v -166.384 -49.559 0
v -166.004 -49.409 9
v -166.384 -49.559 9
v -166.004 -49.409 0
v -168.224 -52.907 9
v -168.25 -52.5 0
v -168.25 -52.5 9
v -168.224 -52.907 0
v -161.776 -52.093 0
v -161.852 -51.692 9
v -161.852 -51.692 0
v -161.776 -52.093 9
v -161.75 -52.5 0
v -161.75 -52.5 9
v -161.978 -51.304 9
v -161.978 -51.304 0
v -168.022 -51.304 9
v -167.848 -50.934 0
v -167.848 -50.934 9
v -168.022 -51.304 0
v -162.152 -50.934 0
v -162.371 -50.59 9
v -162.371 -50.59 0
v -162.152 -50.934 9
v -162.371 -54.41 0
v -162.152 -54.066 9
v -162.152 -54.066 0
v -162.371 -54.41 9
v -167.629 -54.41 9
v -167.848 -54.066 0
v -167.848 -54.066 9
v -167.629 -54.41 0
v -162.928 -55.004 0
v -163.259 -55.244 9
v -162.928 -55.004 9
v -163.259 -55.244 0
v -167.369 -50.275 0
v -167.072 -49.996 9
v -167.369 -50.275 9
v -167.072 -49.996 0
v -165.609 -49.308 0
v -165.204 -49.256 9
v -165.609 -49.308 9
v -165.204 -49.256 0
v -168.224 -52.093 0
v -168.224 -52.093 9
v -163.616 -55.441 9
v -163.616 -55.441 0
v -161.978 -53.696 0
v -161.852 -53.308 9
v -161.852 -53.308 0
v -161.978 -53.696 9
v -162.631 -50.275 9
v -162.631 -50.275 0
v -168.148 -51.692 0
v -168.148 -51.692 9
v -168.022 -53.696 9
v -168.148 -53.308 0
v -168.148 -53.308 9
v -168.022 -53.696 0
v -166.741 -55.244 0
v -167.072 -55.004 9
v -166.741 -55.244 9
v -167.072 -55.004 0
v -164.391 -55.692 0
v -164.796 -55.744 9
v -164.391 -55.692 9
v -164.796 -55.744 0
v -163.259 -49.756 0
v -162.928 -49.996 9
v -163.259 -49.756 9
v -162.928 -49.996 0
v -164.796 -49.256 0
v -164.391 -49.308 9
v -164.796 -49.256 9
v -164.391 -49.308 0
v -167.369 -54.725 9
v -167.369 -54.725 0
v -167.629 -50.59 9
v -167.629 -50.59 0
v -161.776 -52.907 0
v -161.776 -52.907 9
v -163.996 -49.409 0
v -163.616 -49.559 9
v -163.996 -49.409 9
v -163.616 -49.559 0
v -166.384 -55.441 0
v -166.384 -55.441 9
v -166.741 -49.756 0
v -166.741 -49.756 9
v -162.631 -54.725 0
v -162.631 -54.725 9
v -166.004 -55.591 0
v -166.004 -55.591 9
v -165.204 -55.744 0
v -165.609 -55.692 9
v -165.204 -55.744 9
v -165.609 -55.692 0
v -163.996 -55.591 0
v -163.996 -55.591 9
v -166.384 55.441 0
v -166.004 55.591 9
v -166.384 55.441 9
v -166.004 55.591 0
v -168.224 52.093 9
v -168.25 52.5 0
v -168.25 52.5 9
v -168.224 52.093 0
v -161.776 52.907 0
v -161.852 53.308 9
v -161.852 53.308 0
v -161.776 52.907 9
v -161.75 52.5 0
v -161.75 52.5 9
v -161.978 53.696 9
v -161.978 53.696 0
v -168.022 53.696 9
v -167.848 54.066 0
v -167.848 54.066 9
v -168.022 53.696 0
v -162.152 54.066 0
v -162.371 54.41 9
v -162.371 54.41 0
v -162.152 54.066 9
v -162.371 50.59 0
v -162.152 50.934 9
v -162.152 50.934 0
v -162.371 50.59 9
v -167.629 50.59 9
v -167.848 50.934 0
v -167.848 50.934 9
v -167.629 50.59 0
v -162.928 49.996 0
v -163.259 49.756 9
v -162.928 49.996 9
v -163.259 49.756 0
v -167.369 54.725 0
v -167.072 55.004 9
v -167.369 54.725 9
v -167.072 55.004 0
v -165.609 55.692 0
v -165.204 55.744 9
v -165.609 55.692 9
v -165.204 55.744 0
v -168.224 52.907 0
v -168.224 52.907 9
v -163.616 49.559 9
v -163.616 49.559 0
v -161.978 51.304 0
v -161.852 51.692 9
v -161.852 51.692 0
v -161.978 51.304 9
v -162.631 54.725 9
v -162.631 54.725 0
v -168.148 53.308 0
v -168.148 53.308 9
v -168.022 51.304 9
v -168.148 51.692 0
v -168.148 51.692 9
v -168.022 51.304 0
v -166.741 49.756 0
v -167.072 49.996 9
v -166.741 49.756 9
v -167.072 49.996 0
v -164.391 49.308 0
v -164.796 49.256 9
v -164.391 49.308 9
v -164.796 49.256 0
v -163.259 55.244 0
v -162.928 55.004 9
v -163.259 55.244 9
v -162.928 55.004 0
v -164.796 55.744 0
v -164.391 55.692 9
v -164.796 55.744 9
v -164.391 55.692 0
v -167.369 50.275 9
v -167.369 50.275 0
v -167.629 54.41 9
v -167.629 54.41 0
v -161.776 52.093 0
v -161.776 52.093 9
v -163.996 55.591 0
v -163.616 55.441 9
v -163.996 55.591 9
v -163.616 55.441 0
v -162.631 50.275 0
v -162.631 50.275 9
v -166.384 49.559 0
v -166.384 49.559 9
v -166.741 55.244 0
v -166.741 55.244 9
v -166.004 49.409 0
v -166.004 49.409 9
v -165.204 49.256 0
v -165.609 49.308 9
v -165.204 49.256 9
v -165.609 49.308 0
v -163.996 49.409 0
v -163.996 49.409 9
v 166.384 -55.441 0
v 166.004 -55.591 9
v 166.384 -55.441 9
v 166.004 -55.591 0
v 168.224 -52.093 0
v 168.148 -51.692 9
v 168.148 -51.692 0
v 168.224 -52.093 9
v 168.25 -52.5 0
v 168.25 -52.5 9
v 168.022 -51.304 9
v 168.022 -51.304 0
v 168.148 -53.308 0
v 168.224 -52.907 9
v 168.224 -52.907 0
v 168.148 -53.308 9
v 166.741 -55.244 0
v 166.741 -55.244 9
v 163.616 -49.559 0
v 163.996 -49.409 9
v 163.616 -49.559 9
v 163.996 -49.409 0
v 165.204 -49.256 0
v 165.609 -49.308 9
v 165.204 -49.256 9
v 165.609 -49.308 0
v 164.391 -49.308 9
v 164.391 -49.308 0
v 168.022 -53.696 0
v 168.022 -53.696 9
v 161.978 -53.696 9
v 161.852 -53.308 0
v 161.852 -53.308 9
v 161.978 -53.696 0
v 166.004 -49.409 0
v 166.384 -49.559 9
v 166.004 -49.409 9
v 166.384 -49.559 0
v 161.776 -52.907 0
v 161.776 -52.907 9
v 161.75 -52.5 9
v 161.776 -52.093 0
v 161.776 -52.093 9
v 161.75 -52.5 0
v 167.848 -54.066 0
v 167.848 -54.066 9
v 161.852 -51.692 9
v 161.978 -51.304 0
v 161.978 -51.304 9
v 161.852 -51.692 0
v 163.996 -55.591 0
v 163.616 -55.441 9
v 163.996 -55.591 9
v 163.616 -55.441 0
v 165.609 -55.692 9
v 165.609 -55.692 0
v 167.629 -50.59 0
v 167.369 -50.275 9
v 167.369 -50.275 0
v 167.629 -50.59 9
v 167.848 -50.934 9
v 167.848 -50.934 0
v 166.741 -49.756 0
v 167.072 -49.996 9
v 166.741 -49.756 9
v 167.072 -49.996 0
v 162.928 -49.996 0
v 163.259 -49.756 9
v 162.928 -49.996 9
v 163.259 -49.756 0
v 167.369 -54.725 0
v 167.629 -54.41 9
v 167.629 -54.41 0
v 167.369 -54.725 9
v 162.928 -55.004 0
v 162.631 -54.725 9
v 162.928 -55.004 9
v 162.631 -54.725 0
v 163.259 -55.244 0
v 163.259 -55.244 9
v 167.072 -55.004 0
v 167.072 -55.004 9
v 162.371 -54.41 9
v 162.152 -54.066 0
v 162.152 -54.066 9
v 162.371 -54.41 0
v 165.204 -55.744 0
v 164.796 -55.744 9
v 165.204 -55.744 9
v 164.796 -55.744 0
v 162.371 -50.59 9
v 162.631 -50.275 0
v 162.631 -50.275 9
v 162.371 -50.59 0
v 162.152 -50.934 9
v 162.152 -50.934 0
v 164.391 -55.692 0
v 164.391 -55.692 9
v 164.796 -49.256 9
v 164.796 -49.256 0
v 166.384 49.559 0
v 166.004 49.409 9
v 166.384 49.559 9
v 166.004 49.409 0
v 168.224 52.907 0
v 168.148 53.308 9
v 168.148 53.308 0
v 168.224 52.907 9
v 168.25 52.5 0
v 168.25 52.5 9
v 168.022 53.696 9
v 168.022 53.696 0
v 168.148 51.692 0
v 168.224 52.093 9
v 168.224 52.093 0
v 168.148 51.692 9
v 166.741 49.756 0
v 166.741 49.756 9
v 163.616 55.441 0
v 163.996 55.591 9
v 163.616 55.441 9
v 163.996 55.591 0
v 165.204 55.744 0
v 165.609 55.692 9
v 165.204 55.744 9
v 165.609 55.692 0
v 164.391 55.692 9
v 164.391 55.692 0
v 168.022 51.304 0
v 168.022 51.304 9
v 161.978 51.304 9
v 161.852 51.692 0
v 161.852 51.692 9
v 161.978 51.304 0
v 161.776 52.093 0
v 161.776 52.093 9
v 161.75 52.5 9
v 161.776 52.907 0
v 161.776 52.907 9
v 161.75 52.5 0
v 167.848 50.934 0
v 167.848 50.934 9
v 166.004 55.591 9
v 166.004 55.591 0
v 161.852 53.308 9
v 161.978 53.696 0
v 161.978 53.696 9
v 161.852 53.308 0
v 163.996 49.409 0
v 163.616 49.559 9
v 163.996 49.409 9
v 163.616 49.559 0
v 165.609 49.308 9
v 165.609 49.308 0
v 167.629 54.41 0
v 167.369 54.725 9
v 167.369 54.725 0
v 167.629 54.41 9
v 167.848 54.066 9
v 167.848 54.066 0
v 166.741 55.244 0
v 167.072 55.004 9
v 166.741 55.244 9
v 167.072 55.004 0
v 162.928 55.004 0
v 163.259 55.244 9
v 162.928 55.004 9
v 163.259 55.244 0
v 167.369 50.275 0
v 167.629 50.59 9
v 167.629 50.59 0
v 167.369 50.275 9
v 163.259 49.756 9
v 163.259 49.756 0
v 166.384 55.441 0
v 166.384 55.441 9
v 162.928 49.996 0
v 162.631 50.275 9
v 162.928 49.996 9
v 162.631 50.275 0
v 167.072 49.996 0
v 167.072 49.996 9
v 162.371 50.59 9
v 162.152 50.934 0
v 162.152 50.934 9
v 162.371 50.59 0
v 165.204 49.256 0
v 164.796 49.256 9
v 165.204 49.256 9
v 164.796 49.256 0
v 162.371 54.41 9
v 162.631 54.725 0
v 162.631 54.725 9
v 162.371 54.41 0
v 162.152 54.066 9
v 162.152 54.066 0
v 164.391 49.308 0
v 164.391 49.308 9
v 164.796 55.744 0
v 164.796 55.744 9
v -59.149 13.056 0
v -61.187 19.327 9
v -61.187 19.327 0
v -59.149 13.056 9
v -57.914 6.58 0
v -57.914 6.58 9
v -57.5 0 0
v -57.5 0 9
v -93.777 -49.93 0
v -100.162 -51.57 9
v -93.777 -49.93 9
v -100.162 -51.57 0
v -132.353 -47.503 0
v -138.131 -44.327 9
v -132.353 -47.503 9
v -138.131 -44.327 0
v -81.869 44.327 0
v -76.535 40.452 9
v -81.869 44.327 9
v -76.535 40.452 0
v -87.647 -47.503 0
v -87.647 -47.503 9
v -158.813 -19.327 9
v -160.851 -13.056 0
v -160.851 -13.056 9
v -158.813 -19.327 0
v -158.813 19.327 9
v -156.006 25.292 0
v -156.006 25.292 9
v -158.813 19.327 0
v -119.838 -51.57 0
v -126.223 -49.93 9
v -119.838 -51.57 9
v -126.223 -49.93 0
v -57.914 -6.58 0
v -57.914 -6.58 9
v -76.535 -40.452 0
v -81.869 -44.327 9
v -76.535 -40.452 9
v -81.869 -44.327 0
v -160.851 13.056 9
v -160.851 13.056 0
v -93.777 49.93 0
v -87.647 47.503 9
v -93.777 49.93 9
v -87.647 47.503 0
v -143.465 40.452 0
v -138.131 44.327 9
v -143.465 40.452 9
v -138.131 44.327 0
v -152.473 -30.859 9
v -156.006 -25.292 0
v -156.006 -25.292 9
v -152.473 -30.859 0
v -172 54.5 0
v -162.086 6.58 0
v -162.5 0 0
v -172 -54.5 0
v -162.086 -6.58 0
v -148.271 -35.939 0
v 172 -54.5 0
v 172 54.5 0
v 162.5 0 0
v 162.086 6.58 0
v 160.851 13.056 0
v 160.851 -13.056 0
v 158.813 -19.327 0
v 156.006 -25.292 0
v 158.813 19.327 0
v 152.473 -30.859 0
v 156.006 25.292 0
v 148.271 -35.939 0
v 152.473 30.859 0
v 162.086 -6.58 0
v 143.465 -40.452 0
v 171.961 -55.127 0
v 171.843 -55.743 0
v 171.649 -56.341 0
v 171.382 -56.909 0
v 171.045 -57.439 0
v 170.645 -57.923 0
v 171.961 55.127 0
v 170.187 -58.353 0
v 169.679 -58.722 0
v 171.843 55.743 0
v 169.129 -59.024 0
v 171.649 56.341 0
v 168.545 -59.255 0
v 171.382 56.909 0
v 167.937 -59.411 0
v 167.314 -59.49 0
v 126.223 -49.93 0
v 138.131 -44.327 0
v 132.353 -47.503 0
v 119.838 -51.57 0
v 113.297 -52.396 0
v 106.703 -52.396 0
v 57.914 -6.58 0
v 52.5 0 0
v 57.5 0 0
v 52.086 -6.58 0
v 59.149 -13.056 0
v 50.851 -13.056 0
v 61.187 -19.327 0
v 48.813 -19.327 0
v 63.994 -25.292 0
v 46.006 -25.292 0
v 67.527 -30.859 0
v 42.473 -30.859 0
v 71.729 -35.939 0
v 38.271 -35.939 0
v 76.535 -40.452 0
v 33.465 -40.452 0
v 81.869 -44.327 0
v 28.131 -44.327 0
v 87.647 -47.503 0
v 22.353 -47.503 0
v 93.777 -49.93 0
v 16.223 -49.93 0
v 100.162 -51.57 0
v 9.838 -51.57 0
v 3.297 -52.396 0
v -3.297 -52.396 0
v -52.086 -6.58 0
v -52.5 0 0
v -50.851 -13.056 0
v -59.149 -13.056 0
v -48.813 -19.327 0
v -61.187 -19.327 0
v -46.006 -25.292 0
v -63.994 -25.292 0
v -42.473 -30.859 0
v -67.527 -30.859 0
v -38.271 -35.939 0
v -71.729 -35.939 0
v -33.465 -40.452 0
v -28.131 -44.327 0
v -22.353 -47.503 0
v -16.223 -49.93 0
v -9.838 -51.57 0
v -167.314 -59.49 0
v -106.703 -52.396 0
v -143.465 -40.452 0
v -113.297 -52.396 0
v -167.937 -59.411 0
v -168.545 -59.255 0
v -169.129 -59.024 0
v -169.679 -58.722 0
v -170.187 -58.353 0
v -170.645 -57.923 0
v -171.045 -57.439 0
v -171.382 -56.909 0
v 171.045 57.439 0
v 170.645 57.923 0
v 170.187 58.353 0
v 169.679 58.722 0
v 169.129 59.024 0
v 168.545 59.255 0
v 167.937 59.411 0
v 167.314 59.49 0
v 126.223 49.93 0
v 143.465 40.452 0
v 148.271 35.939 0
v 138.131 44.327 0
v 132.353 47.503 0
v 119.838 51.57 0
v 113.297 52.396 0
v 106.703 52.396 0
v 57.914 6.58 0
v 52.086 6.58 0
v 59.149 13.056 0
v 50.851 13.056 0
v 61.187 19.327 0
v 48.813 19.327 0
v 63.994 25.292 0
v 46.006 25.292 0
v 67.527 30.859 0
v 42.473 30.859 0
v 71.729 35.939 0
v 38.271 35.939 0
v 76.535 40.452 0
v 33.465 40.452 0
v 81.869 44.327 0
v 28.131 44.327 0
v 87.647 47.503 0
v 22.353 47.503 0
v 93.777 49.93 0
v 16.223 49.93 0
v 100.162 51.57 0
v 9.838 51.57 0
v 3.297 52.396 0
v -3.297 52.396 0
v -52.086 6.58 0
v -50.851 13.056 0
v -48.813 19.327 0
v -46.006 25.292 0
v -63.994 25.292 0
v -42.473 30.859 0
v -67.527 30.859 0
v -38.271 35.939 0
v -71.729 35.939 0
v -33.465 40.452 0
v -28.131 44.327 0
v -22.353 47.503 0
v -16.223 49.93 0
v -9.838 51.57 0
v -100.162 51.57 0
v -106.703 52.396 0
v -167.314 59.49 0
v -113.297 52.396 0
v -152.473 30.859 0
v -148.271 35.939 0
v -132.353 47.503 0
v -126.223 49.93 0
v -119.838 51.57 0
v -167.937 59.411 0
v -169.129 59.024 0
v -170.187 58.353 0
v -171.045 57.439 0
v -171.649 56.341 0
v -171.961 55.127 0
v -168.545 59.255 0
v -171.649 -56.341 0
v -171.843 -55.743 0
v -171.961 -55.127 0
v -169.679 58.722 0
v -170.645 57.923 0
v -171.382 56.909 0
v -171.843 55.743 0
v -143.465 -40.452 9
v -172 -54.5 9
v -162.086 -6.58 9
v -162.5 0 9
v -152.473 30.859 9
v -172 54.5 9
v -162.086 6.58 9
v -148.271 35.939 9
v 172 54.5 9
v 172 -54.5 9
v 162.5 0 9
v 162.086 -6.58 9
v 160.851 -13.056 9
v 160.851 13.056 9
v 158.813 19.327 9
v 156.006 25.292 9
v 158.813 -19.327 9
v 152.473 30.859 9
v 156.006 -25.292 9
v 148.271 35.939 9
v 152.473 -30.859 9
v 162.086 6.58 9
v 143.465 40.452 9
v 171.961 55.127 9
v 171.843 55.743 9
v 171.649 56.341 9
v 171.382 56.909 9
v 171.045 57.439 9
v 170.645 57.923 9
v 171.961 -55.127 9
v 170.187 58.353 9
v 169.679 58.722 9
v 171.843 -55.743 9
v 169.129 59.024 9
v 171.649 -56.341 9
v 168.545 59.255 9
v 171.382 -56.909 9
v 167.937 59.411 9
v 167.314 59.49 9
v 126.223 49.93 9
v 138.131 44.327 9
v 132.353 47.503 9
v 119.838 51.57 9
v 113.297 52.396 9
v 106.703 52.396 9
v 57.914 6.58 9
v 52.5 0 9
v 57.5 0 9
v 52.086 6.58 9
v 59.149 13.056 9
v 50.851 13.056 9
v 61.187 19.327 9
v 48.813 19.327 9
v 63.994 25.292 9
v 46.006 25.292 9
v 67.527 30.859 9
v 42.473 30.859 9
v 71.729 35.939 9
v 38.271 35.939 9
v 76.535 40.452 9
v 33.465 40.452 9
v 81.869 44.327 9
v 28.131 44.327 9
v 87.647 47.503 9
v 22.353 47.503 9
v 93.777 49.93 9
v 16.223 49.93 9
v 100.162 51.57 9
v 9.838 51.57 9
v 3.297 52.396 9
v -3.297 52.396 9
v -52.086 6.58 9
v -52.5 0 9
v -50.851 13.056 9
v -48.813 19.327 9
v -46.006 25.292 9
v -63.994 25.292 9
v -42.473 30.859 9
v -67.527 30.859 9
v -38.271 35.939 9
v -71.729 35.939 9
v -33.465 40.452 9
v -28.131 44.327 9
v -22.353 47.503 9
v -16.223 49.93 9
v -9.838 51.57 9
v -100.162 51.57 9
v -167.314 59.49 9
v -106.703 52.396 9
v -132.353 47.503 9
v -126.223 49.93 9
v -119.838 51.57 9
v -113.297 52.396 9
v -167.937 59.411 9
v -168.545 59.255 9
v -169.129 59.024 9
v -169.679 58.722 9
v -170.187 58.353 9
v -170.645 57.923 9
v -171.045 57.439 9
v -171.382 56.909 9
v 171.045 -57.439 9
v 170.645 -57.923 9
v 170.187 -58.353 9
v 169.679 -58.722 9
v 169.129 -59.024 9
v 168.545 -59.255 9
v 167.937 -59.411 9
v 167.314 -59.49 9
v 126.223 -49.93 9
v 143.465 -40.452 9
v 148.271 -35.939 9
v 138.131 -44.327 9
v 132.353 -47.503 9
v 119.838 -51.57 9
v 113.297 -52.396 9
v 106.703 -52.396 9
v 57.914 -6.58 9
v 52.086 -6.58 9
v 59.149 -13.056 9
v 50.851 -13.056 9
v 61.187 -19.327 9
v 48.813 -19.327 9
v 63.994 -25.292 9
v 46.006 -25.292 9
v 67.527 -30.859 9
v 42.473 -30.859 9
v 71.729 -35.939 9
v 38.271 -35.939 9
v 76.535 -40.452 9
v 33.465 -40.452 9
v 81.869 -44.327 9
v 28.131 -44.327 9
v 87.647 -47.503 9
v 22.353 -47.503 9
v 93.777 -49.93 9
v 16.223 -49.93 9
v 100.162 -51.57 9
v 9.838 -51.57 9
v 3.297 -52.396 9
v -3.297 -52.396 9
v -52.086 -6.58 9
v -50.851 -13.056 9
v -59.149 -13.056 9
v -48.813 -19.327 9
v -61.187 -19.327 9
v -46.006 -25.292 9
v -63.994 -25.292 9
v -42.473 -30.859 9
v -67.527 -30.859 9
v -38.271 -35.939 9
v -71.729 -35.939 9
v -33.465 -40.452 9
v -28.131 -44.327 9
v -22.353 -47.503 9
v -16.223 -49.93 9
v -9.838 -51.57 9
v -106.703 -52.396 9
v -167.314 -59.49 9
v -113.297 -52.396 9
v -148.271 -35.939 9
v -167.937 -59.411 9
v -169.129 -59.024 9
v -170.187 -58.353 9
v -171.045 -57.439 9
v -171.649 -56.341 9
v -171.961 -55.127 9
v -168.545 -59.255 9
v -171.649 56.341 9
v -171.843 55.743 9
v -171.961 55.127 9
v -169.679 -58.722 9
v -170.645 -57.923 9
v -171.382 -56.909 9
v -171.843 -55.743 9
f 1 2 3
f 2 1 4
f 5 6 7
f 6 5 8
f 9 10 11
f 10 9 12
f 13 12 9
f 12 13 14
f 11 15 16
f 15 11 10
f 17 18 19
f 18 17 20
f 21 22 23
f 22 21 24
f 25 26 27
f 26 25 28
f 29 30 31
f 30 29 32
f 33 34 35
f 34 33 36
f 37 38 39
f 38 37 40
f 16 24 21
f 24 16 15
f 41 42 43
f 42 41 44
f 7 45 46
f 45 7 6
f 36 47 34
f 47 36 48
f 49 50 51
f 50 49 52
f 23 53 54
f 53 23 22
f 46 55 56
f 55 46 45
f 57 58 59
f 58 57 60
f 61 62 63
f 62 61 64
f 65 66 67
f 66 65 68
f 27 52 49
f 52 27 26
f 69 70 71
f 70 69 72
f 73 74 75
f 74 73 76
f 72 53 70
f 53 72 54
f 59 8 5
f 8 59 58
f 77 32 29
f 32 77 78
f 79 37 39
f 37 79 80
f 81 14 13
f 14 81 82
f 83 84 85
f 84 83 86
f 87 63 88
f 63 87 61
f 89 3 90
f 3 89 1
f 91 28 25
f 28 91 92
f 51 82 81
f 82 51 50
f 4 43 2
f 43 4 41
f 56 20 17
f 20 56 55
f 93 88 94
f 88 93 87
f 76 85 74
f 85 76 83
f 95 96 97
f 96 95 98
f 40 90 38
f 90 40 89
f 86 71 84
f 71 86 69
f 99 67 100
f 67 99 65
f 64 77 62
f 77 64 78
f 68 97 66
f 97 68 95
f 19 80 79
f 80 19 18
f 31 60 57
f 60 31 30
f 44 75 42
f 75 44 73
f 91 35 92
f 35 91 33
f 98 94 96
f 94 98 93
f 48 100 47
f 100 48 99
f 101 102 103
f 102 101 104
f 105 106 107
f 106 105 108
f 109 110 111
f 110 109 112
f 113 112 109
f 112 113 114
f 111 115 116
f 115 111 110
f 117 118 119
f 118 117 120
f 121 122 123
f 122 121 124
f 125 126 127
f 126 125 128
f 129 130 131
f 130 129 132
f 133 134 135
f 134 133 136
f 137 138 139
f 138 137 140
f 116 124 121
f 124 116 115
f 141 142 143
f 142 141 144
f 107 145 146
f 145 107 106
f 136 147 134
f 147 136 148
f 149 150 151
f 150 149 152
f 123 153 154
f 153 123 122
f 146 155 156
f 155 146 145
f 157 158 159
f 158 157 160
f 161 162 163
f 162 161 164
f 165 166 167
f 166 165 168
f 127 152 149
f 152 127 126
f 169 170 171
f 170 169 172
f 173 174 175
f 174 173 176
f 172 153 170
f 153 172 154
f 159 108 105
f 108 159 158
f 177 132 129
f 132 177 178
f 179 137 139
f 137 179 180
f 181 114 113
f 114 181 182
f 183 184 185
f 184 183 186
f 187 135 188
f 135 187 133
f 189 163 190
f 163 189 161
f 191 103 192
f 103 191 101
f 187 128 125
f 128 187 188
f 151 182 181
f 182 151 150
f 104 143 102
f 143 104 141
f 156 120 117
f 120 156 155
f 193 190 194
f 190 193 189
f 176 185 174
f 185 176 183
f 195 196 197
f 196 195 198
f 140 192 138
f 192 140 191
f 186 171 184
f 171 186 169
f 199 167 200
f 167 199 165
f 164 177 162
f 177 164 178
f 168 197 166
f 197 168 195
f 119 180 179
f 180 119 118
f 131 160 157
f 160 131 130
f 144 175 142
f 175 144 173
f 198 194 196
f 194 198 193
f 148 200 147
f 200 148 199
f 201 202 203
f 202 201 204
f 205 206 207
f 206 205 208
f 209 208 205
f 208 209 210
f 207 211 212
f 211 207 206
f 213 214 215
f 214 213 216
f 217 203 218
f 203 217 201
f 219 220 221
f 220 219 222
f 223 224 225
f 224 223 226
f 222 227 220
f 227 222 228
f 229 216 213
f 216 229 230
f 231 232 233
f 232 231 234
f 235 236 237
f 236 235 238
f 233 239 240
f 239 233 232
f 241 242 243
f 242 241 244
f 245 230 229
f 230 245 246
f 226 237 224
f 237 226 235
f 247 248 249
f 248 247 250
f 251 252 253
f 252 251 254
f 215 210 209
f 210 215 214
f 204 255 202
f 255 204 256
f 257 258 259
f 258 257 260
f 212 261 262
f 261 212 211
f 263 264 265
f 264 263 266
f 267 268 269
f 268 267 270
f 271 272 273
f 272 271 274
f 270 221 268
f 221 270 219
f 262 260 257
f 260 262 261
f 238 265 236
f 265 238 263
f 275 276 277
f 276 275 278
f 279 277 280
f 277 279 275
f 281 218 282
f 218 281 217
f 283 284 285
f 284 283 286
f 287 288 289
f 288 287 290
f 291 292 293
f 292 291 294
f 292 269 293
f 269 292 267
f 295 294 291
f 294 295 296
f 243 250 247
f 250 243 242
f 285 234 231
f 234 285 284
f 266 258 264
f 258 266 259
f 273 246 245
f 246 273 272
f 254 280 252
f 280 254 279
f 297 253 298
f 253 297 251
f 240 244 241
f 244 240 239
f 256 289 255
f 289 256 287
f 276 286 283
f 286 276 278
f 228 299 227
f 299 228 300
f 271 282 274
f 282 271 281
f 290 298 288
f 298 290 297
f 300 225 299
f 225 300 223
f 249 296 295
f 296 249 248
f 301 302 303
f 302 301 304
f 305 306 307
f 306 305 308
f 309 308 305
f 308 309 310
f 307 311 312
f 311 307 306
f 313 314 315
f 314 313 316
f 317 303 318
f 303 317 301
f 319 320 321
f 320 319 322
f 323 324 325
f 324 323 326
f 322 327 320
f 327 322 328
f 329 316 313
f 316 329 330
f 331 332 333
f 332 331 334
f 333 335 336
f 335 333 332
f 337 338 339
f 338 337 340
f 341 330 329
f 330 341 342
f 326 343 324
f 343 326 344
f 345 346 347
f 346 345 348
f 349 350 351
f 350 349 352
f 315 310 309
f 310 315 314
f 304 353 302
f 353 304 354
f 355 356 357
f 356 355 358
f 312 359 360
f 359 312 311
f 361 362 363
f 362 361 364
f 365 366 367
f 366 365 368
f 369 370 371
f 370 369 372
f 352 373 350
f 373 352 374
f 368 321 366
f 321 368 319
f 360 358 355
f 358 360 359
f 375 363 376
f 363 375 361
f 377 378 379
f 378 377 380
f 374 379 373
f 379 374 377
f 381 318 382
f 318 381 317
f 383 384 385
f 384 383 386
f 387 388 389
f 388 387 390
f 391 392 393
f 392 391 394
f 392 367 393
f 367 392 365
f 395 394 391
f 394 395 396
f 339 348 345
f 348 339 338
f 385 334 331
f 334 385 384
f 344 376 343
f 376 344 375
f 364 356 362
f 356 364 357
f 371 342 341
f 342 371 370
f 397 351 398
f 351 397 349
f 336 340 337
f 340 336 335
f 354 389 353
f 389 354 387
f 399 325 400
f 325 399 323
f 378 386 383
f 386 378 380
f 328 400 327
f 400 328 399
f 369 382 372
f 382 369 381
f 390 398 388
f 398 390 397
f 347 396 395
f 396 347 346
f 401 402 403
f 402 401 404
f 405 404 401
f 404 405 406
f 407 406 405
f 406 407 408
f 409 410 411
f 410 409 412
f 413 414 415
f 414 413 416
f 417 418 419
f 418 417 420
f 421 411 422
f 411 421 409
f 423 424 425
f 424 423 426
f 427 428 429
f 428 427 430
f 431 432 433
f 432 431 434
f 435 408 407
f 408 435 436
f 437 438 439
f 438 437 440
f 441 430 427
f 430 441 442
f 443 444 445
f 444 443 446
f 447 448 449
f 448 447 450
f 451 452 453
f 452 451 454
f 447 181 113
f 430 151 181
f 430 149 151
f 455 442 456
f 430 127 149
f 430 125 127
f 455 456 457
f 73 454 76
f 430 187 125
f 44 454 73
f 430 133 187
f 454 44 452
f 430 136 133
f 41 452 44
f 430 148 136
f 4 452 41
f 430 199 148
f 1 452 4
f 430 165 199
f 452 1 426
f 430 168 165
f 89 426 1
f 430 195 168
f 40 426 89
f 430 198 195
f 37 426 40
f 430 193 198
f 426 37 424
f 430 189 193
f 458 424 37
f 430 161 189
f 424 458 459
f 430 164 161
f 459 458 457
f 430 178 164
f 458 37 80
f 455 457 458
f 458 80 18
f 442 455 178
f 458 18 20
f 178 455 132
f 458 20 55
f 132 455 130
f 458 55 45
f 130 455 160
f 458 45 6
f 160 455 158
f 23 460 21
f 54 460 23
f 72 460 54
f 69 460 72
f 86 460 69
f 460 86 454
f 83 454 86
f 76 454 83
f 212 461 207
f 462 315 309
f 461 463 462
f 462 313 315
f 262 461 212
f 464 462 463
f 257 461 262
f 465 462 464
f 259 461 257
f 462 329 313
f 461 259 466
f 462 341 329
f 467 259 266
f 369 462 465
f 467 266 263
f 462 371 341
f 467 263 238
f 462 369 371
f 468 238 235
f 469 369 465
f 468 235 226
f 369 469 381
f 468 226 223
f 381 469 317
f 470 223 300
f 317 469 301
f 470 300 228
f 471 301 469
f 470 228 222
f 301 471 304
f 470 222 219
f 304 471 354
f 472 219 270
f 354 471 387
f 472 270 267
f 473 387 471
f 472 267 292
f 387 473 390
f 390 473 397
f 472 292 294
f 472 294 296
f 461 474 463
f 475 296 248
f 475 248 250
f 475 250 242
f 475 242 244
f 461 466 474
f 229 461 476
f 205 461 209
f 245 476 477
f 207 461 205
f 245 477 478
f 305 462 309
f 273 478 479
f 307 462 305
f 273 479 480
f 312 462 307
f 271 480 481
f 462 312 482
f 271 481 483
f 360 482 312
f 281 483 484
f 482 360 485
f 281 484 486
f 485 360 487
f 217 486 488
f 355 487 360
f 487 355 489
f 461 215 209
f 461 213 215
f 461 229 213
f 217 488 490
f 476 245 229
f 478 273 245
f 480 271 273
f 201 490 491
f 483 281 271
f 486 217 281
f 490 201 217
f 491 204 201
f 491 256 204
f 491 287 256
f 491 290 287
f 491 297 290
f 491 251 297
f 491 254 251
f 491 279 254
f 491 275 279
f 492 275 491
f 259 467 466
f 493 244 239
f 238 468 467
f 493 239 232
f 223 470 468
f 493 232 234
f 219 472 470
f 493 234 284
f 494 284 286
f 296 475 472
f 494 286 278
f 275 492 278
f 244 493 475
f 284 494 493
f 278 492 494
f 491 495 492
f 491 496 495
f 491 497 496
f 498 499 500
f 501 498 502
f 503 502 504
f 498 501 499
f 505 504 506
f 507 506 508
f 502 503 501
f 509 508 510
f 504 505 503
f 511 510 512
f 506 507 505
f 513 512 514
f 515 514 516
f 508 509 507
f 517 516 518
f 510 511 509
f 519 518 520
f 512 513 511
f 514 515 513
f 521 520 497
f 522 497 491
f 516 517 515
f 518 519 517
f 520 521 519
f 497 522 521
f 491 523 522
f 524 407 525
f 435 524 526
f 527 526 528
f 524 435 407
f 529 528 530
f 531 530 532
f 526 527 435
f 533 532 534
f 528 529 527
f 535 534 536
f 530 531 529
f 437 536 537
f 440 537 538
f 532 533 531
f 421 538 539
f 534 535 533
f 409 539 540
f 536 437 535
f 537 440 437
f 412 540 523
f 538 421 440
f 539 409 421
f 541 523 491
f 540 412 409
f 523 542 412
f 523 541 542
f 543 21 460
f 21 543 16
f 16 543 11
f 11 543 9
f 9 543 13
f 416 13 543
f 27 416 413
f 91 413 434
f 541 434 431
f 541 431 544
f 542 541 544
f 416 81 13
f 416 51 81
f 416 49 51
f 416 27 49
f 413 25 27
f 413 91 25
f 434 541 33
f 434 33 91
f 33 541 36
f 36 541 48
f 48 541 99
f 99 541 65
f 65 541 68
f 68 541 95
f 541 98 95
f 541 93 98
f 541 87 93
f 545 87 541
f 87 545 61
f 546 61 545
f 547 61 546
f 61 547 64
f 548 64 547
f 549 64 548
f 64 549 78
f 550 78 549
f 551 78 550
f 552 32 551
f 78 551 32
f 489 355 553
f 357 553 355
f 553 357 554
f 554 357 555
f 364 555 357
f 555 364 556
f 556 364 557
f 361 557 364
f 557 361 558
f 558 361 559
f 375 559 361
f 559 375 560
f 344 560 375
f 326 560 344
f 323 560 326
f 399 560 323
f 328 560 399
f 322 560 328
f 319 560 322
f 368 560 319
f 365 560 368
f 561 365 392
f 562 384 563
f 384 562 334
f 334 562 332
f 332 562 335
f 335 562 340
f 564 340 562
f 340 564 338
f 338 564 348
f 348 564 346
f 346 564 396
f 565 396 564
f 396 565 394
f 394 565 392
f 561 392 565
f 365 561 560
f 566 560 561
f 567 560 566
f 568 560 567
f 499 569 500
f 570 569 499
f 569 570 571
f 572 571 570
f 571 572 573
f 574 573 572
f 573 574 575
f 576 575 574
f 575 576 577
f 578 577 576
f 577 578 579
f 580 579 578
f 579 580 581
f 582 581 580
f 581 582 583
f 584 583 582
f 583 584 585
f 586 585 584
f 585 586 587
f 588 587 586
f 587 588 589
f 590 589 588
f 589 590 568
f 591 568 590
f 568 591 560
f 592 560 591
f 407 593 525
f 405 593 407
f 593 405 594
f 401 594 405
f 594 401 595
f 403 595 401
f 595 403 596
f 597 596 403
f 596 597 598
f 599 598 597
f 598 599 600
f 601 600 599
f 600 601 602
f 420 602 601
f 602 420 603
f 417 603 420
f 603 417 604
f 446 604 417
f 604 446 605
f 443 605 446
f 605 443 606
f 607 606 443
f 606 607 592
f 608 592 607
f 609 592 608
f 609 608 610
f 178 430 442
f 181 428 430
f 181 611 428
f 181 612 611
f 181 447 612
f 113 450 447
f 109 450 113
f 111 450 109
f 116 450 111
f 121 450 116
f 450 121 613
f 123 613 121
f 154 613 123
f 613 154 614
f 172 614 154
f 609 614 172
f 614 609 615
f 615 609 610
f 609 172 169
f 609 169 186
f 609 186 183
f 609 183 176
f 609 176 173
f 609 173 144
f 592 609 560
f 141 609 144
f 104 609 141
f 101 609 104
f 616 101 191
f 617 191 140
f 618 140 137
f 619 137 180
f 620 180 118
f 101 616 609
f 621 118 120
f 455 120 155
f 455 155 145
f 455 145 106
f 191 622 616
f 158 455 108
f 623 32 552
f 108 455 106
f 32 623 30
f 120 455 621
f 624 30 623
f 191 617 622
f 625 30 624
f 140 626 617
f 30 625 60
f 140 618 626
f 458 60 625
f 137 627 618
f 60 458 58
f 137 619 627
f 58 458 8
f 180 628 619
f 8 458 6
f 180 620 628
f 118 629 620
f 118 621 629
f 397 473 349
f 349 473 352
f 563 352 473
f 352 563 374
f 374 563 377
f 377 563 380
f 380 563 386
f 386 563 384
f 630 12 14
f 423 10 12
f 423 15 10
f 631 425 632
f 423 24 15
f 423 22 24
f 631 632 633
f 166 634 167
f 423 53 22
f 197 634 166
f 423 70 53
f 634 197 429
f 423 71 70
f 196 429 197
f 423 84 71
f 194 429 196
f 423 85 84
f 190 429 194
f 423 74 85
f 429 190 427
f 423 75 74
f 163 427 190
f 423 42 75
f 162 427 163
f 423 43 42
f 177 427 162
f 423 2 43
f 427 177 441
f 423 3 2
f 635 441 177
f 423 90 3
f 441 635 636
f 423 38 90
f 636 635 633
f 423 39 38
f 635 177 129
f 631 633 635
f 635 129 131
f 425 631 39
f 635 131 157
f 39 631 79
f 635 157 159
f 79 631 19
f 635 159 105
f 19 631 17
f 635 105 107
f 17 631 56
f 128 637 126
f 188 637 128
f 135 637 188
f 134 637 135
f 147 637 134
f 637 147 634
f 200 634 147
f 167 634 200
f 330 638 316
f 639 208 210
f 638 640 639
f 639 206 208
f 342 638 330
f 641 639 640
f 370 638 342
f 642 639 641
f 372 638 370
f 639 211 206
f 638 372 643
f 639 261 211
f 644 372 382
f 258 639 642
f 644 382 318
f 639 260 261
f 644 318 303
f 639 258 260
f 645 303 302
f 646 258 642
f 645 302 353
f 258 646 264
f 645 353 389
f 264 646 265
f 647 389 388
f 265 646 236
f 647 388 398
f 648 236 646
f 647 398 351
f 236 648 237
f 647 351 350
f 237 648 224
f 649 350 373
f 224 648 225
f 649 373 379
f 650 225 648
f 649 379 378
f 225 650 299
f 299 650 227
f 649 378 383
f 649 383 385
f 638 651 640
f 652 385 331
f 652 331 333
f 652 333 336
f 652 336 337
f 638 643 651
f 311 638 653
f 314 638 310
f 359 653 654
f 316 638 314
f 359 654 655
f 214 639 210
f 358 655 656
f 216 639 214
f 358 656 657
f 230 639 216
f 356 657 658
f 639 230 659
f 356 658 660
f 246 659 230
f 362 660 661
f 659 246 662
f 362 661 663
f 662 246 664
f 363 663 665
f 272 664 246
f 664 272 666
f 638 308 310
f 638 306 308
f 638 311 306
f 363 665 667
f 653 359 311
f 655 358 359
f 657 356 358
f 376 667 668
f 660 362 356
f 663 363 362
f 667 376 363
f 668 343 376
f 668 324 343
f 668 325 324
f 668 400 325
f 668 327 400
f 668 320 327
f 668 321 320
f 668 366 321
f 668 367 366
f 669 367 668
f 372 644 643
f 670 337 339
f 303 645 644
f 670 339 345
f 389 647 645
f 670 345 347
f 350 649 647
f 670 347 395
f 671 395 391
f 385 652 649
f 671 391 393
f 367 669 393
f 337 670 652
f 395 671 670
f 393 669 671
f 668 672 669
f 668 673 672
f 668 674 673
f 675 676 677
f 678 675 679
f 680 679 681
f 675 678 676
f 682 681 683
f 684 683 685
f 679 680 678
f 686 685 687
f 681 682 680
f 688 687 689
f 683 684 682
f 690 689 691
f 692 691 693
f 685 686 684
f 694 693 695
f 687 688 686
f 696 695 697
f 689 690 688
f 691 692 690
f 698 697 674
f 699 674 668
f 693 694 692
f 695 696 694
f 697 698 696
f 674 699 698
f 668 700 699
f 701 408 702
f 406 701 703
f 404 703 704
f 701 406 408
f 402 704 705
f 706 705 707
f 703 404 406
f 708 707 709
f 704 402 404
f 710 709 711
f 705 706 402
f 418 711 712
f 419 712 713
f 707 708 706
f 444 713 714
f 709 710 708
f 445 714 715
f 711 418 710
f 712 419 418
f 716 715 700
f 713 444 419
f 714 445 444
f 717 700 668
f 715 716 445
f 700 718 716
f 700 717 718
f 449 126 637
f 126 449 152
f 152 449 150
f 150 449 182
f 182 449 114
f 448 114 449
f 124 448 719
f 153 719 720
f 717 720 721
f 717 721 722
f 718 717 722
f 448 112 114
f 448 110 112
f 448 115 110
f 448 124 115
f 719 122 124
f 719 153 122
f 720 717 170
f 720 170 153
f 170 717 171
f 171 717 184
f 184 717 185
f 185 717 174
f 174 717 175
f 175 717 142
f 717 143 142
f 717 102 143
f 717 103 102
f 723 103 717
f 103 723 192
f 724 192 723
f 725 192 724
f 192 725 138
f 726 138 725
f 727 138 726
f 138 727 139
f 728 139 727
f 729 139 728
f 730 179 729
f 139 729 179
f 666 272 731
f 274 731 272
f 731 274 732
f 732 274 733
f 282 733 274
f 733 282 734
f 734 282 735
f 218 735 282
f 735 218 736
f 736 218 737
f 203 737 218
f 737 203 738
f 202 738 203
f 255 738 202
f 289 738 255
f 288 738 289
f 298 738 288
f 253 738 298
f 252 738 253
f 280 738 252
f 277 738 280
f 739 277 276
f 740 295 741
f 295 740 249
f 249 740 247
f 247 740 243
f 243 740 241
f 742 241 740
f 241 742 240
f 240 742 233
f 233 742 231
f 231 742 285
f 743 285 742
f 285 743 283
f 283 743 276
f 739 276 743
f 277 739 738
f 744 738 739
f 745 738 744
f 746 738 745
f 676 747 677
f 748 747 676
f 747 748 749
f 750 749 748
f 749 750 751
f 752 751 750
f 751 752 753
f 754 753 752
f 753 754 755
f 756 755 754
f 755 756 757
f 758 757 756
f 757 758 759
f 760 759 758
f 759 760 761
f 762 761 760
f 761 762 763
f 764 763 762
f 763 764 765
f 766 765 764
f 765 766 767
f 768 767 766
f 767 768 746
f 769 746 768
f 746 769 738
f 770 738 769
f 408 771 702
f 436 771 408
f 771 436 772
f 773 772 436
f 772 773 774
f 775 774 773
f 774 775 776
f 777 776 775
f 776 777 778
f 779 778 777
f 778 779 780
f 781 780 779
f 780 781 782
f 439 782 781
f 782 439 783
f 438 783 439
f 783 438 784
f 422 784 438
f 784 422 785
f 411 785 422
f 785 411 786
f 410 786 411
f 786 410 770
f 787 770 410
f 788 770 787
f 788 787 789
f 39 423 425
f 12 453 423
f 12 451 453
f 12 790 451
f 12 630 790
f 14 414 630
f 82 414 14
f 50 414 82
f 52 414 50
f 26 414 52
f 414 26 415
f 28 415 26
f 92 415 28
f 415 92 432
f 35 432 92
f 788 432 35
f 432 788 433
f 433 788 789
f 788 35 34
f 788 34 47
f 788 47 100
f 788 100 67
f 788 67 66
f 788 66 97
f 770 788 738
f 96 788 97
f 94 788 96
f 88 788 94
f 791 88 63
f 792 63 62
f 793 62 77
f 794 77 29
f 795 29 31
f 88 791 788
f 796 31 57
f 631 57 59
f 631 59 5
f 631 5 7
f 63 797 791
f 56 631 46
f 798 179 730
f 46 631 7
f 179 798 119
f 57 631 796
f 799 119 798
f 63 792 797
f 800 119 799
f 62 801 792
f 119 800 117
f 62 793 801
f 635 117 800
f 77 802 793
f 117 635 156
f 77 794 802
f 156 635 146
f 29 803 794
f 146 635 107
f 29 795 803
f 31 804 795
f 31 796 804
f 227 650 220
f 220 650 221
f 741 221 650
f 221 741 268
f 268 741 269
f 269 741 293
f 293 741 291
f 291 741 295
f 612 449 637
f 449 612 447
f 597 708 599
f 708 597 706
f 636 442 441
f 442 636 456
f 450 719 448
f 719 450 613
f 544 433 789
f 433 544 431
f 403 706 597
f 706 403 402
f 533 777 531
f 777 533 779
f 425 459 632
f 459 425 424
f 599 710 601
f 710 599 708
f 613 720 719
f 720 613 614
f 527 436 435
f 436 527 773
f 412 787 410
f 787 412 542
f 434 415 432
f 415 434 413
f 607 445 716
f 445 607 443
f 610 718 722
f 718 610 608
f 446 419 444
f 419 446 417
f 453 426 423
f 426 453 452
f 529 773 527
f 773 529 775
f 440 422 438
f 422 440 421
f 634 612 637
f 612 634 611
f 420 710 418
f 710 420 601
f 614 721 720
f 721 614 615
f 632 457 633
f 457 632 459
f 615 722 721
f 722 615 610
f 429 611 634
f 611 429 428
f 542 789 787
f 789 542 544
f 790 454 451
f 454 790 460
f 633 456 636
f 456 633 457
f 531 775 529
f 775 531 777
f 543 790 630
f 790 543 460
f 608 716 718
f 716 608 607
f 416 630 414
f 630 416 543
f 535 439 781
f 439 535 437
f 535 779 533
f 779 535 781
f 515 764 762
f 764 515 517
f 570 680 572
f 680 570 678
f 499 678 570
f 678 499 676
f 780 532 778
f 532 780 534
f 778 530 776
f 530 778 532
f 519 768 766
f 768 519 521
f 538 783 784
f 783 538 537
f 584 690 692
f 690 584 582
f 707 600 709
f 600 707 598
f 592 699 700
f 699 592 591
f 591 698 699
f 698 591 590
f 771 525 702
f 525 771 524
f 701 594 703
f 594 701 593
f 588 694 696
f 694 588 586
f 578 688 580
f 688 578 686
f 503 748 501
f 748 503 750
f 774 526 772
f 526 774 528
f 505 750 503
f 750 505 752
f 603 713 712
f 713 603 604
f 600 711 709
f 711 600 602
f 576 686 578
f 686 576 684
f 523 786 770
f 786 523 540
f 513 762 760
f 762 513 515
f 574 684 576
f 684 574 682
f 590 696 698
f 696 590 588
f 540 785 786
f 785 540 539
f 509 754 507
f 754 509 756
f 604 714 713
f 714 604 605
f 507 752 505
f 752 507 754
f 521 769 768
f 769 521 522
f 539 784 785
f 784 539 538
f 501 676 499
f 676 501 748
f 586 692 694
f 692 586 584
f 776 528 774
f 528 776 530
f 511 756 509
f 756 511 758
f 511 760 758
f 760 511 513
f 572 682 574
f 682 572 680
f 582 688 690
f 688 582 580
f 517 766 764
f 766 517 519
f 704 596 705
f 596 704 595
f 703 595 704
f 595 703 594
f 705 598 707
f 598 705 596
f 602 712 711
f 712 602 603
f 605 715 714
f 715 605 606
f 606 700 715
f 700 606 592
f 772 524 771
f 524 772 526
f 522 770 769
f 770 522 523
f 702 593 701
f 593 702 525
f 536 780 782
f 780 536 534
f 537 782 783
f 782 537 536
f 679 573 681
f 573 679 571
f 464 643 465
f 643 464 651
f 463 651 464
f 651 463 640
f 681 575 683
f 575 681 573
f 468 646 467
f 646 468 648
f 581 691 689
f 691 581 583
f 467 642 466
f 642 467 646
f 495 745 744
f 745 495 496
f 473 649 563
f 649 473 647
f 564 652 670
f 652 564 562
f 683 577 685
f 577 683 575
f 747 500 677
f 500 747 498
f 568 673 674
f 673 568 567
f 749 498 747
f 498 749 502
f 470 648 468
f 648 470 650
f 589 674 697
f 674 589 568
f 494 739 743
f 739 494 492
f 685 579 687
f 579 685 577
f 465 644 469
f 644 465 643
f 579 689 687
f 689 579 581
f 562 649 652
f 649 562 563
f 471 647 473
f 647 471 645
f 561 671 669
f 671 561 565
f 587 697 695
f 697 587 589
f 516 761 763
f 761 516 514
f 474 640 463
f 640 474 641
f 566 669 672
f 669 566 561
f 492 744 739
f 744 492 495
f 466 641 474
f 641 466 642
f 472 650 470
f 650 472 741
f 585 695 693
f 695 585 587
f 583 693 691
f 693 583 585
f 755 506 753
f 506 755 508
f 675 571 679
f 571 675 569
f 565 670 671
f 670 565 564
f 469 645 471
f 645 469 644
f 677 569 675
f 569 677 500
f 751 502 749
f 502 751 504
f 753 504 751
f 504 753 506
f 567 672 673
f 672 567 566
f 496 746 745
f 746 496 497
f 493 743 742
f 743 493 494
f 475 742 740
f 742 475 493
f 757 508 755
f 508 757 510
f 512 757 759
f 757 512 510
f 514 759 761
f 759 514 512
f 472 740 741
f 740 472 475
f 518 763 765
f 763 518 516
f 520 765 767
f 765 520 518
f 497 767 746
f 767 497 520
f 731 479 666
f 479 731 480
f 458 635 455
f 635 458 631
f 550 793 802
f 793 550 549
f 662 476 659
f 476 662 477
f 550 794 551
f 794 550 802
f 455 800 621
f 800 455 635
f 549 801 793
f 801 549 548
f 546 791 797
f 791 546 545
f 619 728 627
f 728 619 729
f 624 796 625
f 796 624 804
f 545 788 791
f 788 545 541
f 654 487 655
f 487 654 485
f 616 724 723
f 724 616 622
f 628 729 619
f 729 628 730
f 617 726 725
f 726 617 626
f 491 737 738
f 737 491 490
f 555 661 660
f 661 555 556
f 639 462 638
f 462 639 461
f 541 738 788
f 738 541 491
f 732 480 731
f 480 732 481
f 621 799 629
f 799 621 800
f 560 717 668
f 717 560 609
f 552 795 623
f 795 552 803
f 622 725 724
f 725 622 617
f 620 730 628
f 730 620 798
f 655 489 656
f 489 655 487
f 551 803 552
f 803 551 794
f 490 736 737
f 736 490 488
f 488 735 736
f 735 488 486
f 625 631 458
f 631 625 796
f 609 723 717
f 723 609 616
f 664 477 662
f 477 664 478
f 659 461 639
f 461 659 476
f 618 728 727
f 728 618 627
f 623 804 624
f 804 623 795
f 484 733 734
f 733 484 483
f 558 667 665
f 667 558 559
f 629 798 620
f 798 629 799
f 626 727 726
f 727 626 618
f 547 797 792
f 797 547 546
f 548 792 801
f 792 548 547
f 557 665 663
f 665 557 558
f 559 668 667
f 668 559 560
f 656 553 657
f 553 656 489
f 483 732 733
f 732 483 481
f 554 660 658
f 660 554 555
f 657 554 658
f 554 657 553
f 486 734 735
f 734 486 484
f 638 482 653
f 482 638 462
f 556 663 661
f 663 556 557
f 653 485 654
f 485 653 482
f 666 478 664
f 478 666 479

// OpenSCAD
$fn = 50;

difference() {
	union() {
		hull() {
			translate(v = [-167.0, 54.5, 0]) {
				cylinder(h = 9, r = 5);
			}
			translate(v = [167.0, 54.5, 0]) {
				cylinder(h = 9, r = 5);
			}
			translate(v = [-167.0, -54.5, 0]) {
				cylinder(h = 9, r = 5);
			}
			translate(v = [167.0, -54.5, 0]) {
				cylinder(h = 9, r = 5);
			}
		}
	}
	union() {
		translate(v = [-165.0, -52.5, -100.0]) {
			cylinder(h = 200, r = 3.25);
		}
		translate(v = [-165.0, 52.5, -100.0]) {
			cylinder(h = 200, r = 3.25);
		}
		translate(v = [165.0, -52.5, -100.0]) {
			cylinder(h = 200, r = 3.25);
		}
		translate(v = [165.0, 52.5, -100.0]) {
			cylinder(h = 200, r = 3.25);
		}
		translate(v = [-165.0, -52.5, -100.0]) {
			cylinder(h = 200, r = 1.8);
		}
		translate(v = [-165.0, 52.5, -100.0]) {
			cylinder(h = 200, r = 1.8);
		}
		translate(v = [165.0, -52.5, -100.0]) {
			cylinder(h = 200, r = 1.8);
		}
		translate(v = [165.0, 52.5, -100.0]) {
			cylinder(h = 200, r = 1.8);
		}
		translate(v = [-110.0, 0, 0.0]) {
			cylinder(h = 9, r = 52.5);
		}
		cylinder(h = 9, r = 52.5);
		translate(v = [110.0, 0, 0.0]) {
			cylinder(h = 9, r = 52.5);
		}
	}
}
